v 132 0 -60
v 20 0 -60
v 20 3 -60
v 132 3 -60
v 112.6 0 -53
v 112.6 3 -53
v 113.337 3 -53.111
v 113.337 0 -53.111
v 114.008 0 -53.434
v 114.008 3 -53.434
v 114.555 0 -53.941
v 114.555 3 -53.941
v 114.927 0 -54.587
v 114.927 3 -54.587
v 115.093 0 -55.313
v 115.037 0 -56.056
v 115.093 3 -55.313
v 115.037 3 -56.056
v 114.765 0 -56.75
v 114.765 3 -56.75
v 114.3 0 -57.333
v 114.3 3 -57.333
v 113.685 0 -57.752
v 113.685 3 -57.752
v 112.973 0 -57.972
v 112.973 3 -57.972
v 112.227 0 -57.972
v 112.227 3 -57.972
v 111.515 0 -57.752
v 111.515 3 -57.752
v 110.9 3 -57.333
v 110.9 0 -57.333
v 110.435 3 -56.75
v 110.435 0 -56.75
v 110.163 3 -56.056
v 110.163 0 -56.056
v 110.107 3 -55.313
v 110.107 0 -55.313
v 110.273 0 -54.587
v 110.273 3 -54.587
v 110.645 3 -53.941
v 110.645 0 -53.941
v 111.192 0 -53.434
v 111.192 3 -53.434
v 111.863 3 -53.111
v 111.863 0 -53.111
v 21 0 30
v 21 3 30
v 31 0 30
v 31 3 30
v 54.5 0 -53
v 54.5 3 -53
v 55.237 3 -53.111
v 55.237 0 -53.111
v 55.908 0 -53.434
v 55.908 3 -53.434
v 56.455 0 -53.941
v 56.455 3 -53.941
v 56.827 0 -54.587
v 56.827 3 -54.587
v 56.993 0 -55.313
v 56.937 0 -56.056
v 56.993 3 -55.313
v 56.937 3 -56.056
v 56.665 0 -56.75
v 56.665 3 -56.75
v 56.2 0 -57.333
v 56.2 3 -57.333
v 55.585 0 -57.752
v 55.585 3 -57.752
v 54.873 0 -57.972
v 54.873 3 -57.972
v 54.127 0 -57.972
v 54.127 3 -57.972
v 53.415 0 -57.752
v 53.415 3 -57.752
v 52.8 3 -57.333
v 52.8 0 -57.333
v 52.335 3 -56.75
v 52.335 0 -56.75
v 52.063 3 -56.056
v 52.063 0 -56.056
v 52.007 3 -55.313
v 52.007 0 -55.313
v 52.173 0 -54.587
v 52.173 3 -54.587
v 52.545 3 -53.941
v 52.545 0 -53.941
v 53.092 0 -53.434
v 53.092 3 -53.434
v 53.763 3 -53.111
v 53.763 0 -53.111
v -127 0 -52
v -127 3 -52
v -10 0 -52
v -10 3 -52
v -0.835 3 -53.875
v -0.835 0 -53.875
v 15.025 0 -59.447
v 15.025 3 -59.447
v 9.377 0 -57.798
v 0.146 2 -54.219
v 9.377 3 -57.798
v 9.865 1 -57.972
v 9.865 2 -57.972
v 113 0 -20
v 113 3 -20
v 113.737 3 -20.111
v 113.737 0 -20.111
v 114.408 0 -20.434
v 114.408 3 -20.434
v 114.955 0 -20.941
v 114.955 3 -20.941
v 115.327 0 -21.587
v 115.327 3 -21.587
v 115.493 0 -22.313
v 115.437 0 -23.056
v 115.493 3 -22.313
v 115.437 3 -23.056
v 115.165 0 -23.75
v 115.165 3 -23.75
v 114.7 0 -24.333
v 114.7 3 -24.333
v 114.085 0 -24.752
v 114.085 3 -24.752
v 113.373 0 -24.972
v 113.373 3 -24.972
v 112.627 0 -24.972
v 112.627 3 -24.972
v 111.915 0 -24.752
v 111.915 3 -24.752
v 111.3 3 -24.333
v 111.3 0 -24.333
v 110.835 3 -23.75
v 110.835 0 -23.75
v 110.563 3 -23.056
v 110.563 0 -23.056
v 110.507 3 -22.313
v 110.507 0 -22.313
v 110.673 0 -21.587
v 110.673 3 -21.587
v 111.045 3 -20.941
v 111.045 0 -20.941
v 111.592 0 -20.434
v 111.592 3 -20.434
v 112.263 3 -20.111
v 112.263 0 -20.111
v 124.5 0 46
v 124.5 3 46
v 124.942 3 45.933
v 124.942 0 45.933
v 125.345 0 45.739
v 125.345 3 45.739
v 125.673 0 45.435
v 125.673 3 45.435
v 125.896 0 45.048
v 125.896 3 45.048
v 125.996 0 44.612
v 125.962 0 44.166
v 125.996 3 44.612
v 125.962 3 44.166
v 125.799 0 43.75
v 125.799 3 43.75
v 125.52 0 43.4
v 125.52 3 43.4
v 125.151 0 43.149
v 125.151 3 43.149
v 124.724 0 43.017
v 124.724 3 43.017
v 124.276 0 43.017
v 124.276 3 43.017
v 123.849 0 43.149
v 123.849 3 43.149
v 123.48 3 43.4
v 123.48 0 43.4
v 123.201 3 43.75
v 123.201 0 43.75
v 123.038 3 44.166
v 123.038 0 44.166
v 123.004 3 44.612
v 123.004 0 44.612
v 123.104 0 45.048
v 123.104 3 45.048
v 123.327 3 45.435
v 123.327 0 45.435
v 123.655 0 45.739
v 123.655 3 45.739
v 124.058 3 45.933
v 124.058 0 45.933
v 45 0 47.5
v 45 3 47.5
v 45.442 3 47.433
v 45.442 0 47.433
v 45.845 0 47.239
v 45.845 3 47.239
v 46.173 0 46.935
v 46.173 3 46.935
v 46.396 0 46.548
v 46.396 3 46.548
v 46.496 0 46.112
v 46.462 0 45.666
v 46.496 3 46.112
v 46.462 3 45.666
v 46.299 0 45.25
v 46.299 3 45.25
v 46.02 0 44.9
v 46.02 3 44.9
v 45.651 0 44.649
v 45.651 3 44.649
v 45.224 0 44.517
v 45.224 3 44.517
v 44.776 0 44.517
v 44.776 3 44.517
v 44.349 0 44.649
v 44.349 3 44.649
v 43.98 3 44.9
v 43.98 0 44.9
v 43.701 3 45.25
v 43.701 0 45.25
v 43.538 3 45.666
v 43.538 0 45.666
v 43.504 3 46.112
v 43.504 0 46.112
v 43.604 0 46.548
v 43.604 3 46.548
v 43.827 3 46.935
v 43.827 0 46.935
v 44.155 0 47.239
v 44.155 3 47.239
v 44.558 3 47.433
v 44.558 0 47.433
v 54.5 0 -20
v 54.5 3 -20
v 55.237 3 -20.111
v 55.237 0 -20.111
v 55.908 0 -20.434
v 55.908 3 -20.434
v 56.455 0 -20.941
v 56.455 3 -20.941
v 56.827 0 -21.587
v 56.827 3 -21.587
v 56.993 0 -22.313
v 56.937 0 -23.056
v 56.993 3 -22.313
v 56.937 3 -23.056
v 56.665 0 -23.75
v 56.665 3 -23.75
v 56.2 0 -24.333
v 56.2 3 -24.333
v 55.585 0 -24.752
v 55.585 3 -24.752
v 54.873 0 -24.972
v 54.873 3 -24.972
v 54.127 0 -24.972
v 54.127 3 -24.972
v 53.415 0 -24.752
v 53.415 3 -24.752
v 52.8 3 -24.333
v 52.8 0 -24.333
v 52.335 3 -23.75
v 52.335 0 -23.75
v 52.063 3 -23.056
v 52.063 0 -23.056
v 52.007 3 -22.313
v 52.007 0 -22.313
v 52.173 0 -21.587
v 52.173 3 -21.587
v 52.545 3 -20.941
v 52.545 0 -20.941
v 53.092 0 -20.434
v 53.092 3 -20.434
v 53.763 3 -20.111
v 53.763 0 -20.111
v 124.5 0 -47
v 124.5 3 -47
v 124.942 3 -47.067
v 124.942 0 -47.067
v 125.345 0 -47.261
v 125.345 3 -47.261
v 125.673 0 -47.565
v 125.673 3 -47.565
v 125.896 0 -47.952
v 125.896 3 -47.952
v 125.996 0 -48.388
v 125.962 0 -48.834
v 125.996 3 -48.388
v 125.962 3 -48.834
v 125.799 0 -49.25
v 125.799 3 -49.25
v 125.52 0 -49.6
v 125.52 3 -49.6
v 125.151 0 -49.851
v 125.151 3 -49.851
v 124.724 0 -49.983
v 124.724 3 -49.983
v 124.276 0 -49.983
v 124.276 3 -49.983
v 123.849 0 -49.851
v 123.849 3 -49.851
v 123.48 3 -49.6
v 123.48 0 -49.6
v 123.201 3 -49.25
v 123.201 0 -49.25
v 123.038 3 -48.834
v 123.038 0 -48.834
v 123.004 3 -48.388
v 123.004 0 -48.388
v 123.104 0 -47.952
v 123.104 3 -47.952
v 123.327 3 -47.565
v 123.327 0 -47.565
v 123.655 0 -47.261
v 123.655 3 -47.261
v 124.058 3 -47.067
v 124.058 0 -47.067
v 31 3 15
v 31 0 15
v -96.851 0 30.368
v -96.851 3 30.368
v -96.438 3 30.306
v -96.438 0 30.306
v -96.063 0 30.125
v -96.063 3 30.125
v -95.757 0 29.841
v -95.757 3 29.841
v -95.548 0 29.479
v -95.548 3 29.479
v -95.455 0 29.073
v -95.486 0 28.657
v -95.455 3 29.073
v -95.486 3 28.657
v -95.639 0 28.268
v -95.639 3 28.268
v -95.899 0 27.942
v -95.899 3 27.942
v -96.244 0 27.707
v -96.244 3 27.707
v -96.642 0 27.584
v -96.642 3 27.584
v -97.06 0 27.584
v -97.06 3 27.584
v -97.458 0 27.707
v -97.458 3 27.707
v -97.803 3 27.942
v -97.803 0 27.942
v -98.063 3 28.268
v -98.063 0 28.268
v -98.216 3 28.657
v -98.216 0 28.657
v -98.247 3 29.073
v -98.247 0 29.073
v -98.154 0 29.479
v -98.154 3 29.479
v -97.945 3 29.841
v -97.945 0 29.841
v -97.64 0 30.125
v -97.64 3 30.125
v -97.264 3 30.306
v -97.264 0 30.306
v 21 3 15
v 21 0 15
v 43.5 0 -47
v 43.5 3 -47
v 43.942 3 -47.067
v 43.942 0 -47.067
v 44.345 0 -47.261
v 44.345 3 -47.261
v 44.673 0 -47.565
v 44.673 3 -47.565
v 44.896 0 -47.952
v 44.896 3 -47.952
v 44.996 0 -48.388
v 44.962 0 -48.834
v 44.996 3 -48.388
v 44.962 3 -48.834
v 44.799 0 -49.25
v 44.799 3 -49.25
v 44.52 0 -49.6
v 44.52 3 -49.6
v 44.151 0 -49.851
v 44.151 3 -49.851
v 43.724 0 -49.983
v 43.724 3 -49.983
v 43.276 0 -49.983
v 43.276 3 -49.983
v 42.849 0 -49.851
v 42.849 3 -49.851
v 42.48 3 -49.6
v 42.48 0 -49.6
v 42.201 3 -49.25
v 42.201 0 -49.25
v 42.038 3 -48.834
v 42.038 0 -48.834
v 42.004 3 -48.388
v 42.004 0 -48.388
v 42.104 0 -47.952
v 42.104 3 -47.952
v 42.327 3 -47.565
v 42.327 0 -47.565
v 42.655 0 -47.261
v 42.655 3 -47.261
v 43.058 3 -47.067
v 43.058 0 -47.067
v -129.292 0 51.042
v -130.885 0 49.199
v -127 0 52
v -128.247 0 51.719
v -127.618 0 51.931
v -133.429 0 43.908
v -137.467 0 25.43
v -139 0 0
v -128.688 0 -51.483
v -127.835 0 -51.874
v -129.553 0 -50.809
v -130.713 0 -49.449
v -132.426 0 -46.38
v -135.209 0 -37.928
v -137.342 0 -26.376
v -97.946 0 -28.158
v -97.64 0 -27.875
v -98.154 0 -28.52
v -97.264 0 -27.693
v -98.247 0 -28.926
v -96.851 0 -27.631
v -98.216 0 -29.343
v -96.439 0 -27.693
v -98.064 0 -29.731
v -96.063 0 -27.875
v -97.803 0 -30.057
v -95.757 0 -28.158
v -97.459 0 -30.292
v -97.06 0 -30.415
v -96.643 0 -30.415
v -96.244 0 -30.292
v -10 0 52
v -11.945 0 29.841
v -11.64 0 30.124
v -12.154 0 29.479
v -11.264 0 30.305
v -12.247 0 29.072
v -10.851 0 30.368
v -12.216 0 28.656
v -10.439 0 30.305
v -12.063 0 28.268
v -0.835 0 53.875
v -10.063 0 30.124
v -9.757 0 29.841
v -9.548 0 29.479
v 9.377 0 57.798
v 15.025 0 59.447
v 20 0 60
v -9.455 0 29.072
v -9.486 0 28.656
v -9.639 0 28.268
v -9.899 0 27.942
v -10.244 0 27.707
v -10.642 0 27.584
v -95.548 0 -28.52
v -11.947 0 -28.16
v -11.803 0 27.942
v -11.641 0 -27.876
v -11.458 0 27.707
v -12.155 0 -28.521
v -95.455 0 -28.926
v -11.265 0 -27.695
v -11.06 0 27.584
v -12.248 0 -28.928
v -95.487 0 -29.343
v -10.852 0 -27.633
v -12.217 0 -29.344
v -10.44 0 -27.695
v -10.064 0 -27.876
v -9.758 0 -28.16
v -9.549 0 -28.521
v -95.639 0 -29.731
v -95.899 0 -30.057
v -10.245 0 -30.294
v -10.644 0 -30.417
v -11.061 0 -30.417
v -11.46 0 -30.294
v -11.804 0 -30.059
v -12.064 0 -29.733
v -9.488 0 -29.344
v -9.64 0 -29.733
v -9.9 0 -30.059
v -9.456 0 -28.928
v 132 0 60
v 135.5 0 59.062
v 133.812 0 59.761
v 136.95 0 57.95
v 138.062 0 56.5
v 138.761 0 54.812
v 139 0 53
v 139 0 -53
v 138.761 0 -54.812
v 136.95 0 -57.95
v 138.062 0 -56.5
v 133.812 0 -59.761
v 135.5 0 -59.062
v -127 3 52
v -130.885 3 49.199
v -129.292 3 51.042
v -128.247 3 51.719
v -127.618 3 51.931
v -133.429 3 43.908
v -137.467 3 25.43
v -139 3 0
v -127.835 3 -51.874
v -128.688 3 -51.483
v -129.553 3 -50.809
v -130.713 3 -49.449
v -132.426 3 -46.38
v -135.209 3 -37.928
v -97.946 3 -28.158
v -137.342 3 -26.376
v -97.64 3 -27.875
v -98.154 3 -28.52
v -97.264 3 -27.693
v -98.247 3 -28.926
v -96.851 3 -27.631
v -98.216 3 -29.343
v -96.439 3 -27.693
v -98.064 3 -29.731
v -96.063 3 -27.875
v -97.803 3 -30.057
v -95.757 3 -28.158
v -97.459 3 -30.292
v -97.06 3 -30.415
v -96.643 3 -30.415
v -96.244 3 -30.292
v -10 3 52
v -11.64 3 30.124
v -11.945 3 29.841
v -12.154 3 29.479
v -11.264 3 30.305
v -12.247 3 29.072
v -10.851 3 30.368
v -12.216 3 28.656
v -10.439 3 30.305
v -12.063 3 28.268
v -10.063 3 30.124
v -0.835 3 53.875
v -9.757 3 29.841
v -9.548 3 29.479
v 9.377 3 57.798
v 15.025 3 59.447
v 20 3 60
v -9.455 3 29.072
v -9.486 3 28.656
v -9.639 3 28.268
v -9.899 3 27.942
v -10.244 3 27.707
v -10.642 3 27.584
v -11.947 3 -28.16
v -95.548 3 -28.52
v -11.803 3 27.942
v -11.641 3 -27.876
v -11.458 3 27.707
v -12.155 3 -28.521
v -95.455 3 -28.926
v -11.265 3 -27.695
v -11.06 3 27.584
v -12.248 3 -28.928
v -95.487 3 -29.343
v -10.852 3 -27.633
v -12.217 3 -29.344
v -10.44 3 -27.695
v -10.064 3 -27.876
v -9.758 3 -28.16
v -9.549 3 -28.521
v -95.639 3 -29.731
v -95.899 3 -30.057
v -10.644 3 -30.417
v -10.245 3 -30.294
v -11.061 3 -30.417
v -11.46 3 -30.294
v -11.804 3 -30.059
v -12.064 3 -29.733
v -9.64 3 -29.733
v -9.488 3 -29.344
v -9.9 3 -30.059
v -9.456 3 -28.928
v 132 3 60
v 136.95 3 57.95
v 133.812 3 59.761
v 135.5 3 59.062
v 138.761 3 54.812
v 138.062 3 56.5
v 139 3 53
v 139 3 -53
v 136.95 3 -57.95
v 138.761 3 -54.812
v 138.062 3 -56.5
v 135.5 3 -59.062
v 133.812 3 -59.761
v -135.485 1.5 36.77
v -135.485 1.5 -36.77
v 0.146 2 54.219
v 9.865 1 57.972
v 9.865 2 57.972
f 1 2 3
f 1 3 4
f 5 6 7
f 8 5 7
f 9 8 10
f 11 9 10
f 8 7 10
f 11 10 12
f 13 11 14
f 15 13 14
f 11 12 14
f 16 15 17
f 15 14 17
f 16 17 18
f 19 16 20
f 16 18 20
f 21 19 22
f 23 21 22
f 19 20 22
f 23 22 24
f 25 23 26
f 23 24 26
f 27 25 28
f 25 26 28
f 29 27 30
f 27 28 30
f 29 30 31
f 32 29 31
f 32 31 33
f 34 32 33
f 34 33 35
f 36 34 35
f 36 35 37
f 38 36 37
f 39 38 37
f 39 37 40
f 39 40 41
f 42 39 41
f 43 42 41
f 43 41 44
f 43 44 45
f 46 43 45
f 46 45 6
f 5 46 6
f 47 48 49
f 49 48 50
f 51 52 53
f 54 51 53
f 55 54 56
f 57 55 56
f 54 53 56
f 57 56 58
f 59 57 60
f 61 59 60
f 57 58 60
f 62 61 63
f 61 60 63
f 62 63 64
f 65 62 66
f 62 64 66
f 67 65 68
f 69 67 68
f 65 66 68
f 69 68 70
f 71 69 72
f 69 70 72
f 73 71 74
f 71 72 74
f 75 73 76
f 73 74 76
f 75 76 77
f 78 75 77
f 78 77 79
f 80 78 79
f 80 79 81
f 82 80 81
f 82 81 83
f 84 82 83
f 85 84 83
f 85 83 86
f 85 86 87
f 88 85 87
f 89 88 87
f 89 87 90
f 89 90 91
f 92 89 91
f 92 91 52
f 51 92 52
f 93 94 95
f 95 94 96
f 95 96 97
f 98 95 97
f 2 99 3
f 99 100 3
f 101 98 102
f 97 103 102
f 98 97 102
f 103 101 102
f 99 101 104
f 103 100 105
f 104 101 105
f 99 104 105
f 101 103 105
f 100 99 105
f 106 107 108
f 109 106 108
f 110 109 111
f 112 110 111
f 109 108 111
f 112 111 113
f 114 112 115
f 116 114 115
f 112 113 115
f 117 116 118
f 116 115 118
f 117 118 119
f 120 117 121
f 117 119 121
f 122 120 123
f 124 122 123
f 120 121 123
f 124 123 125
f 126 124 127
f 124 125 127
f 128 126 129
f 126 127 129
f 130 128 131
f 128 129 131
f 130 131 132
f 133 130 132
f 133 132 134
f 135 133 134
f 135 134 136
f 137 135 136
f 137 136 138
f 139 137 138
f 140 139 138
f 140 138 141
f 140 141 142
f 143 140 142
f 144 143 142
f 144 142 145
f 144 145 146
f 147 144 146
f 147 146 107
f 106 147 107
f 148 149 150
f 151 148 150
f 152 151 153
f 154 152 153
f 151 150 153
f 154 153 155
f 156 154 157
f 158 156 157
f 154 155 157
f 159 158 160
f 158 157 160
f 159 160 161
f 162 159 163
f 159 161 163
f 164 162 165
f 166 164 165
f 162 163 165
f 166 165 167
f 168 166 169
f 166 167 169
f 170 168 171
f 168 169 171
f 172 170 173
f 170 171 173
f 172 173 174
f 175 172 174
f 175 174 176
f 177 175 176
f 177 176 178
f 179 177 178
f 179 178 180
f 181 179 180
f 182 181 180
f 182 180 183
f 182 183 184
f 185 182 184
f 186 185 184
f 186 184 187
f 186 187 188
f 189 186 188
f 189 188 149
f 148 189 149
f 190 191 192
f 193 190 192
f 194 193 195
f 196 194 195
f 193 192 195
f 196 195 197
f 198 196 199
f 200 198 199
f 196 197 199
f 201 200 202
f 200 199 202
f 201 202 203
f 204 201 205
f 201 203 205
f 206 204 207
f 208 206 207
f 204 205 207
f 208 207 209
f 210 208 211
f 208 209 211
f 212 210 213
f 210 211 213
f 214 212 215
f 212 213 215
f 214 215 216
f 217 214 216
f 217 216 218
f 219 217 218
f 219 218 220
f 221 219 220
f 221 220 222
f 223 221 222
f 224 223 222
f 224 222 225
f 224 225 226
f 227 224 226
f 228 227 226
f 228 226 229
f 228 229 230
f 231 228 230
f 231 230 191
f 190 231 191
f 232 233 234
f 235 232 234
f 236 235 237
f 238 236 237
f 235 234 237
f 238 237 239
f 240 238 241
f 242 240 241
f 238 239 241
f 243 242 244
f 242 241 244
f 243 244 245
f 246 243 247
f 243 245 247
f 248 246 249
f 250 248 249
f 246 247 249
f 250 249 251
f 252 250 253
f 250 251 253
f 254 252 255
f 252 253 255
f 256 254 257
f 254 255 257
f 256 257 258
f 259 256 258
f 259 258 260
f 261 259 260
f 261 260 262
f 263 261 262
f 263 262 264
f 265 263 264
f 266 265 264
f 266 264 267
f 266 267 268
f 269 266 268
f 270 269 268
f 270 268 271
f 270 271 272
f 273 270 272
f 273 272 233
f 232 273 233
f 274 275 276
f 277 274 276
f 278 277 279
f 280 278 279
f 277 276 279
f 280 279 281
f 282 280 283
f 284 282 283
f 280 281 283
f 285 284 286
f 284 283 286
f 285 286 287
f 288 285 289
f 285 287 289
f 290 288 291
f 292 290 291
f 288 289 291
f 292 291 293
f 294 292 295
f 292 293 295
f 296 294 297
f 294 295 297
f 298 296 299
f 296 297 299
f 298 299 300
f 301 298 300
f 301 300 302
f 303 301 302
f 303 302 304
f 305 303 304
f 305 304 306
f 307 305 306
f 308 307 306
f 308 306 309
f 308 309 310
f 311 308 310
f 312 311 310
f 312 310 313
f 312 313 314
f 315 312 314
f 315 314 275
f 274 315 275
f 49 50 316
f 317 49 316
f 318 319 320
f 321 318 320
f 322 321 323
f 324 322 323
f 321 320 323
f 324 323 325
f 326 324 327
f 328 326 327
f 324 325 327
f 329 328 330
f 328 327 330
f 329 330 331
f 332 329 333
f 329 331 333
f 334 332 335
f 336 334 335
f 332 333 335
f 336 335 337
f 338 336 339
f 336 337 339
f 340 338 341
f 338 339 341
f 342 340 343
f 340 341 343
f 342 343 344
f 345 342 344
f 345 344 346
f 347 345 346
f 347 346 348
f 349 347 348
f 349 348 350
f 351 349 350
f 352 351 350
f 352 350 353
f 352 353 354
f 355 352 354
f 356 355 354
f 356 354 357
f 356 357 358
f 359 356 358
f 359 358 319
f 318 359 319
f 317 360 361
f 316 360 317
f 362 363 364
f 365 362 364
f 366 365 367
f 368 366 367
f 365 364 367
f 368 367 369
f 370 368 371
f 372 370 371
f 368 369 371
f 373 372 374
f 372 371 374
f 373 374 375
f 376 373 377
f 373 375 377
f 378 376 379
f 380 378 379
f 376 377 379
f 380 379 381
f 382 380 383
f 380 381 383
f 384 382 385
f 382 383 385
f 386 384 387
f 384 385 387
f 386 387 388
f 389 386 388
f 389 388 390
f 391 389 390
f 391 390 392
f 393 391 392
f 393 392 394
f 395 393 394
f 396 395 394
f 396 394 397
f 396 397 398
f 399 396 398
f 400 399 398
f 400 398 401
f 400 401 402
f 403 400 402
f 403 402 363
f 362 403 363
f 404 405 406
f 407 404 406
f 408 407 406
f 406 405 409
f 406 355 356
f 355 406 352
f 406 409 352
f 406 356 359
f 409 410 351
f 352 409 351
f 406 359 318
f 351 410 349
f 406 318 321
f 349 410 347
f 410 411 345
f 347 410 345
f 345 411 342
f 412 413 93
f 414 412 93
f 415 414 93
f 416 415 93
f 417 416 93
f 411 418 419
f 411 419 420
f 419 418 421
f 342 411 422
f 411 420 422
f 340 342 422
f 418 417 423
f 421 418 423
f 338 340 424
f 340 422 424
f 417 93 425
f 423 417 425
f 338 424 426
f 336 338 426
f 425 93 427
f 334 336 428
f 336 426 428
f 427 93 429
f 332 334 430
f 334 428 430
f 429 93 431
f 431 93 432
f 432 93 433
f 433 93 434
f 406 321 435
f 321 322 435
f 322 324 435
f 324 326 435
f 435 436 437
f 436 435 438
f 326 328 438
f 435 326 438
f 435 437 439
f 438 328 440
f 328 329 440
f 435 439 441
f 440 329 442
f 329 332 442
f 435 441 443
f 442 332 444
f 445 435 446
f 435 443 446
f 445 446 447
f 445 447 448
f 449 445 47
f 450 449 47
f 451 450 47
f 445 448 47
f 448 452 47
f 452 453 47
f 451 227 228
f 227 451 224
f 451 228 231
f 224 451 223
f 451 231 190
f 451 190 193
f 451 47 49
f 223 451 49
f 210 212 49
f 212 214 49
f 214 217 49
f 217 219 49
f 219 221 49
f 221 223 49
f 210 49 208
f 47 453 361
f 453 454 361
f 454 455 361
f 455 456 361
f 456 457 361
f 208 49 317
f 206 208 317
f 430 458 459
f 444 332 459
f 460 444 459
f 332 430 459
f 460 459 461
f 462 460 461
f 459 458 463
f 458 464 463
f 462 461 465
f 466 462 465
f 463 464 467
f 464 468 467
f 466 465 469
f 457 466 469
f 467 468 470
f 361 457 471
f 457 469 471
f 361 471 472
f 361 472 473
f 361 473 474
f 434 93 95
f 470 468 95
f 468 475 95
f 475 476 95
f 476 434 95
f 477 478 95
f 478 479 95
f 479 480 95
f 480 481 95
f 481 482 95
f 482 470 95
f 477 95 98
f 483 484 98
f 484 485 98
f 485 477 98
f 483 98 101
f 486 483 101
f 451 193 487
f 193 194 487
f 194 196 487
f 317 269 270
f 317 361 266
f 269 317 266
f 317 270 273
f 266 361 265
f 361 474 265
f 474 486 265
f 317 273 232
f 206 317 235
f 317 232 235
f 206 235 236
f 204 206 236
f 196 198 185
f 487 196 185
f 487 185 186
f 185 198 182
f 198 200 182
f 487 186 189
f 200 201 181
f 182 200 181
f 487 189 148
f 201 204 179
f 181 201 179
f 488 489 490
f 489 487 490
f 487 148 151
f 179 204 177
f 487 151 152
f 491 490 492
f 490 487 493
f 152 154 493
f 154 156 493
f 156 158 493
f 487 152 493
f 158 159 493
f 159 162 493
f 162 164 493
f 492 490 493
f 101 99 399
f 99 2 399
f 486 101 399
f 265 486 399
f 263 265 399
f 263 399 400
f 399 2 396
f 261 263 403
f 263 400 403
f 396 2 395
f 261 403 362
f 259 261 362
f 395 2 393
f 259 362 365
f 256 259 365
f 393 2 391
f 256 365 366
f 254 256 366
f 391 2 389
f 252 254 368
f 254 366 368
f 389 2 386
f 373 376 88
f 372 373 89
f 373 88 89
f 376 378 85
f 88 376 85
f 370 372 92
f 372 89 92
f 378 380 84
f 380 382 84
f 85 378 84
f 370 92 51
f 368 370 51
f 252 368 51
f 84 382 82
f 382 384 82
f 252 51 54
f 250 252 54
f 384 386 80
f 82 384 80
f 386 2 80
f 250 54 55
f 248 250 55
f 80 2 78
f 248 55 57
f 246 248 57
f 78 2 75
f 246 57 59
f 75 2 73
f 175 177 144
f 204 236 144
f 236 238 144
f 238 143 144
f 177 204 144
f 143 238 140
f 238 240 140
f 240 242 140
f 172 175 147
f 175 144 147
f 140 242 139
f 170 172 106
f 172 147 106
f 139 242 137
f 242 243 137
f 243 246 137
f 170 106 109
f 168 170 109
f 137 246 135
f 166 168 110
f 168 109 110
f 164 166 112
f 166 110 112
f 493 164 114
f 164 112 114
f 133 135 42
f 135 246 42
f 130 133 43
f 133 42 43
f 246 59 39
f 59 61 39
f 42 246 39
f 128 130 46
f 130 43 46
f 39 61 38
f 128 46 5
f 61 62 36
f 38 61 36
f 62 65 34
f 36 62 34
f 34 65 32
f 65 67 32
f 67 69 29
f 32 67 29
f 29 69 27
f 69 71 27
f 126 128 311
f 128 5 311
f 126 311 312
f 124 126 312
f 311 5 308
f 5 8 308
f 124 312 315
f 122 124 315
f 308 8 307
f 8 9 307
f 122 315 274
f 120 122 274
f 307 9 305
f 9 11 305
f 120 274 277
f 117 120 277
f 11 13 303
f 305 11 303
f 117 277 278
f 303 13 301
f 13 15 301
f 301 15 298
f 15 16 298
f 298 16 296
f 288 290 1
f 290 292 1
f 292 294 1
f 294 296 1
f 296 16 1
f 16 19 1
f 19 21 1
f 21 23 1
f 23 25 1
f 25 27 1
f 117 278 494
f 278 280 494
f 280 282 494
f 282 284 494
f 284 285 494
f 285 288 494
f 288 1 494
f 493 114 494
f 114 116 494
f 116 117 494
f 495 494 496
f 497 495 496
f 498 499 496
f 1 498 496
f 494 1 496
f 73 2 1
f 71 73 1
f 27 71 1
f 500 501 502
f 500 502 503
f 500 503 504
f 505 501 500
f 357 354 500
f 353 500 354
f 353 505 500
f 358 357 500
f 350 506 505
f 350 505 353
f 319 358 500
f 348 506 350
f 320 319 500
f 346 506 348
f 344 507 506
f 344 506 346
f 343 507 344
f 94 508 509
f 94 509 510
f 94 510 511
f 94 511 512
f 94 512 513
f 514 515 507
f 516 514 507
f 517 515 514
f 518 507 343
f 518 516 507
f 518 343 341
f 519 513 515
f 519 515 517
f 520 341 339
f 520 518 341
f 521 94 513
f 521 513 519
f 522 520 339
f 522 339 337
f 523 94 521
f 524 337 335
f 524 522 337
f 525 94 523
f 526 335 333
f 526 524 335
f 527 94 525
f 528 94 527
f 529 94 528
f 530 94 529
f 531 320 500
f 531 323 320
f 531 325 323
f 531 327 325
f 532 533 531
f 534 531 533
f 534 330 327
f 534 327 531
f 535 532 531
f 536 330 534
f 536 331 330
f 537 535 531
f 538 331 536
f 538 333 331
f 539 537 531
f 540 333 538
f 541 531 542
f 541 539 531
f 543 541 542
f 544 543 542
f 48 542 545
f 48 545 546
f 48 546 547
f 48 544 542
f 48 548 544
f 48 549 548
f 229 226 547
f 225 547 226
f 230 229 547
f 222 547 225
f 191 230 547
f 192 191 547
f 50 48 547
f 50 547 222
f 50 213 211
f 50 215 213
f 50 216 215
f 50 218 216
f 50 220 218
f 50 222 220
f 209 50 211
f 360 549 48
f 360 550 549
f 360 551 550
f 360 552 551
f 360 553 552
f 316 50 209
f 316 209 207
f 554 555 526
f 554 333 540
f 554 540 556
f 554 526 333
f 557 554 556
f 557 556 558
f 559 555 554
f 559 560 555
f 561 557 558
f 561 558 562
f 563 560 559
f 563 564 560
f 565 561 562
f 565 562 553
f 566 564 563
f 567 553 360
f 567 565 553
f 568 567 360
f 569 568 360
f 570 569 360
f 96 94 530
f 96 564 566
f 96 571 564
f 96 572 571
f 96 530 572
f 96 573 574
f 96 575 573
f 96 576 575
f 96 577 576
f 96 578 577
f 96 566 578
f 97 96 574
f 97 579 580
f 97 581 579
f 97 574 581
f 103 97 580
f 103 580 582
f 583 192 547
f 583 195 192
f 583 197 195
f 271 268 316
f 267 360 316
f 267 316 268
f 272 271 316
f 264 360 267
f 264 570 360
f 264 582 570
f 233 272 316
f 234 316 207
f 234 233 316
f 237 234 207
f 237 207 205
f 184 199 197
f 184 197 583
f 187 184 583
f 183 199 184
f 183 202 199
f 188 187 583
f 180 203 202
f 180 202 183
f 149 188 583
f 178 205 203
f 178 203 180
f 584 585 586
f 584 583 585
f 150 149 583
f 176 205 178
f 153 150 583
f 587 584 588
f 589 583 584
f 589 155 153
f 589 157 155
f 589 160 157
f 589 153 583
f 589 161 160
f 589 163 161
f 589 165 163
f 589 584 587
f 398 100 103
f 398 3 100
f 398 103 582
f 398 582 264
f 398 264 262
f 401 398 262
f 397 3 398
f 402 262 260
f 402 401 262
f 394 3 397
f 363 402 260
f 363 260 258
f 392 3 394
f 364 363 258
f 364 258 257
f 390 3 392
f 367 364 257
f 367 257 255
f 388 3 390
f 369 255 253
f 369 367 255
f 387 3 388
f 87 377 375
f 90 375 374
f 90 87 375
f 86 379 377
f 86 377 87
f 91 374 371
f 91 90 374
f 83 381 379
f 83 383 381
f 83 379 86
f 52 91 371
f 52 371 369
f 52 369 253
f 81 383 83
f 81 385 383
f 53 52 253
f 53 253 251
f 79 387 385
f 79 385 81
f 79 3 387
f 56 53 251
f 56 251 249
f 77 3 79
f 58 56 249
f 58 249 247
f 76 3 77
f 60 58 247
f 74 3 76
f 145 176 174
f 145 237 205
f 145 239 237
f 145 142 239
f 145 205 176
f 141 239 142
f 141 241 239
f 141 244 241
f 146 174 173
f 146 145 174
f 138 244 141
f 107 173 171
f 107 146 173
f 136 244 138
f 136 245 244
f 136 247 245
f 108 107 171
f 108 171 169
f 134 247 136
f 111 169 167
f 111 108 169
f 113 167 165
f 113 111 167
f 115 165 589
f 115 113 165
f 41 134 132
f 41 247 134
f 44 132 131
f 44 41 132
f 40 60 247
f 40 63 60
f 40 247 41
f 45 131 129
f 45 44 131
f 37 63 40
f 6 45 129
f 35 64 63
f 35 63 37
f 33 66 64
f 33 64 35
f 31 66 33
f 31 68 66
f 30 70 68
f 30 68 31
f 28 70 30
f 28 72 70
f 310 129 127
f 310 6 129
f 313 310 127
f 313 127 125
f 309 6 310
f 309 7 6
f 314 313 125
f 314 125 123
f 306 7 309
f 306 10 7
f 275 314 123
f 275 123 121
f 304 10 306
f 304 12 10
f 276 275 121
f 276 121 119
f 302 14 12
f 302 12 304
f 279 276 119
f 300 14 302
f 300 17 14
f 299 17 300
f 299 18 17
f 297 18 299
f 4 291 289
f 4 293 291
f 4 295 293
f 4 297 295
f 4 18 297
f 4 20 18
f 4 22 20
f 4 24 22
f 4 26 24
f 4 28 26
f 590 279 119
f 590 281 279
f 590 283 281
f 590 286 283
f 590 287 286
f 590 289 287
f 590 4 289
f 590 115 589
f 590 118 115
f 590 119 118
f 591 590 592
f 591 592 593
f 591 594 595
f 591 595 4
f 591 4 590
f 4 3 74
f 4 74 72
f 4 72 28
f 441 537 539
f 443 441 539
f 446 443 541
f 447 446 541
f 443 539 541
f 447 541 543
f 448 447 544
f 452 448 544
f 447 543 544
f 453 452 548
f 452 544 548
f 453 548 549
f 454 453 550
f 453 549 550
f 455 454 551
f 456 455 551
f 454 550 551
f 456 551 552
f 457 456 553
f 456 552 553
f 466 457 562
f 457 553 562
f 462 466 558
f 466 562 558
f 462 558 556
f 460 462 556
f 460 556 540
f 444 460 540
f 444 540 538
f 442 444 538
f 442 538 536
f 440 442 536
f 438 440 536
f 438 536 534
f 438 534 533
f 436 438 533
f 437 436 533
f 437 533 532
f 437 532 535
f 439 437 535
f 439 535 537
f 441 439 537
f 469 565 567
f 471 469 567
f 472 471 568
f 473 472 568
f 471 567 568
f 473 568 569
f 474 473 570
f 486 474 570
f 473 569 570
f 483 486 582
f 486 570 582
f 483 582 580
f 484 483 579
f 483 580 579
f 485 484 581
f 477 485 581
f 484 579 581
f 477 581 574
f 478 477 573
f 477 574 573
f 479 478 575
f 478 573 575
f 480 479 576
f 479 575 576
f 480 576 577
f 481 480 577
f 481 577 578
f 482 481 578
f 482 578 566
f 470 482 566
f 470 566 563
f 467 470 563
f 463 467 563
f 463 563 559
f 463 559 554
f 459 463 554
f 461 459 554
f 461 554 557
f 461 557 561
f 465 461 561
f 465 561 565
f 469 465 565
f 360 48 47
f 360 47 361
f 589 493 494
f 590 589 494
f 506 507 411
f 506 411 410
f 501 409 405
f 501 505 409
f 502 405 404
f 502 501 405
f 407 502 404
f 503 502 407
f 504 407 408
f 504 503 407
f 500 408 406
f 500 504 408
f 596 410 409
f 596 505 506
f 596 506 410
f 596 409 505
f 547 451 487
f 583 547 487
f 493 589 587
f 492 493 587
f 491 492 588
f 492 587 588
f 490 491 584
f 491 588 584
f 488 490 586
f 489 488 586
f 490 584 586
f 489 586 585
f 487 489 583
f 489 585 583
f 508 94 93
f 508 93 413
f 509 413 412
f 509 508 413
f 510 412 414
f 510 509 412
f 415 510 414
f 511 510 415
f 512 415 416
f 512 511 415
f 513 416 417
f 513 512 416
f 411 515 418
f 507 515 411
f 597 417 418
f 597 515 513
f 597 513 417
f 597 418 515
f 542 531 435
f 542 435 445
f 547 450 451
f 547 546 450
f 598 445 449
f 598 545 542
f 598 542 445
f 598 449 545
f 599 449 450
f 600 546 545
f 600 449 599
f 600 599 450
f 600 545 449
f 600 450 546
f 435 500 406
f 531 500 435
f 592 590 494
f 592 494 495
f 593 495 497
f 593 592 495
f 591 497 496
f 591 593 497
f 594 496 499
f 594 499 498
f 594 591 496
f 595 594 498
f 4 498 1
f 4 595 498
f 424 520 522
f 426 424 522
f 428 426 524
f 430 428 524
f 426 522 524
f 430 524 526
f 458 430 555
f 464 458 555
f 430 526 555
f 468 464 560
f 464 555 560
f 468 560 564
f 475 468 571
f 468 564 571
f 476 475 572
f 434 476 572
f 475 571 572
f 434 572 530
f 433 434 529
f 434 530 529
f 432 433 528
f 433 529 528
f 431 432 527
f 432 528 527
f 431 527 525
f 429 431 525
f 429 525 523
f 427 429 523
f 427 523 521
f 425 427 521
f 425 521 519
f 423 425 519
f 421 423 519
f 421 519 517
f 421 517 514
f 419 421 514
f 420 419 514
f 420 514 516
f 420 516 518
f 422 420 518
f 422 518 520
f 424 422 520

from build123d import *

# Parameters (mm, degrees)
SKETCH_1_W           = 278
SKETCH_1_H           = 120
EXTRUDE_1_DEPTH      = 3
SKETCH_2_W           = 129
SKETCH_2_H           = 8
CUT_EXTRUDE_1_DEPTH  = 3
CUT_EXTRUDE_2_DEPTH  = 3
CUT_EXTRUDE_4_DEPTH  = 3
CUT_EXTRUDE_5_DEPTH  = 3
SKETCH_16_R          = 1.39979
CUT_EXTRUDE_9_DEPTH  = 10
SKETCH_18_W          = 10
SKETCH_18_H          = 15
CUT_EXTRUDE_10_DEPTH = 10
SKETCH_19_R          = 2.5
CUT_EXTRUDE_11_DEPTH = 10
SKETCH_20_R          = 1.5
CUT_EXTRUDE_12_DEPTH = 10
SKETCH_21_R          = 1.5
CUT_EXTRUDE_13_DEPTH = 10
SKETCH_22_R          = 2.5
CUT_EXTRUDE_14_DEPTH = 10
SKETCH_23_R          = 2.5
CUT_EXTRUDE_15_DEPTH = 10
SKETCH_24_R          = 1.5
CUT_EXTRUDE_16_DEPTH = 10
SKETCH_25_R          = 1.5
CUT_EXTRUDE_17_DEPTH = 10


with BuildPart() as part:
    # 스케치1 → 보스-돌출1 (new body)
    with BuildSketch(Plane(origin=(0, 0, 0), x_dir=(1, 0, 0), z_dir=(0, 1, 0))):
        Rectangle(SKETCH_1_W, SKETCH_1_H)
    extrude(amount=EXTRUDE_1_DEPTH)

    # 스케치2 → 컷-돌출1 (cut)
    with BuildSketch(Plane(origin=(0, 3, 0), x_dir=(1, 0, 0), z_dir=(0, 1, 0))):
        with Locations((-74.5, -56)):
            Rectangle(SKETCH_2_W, SKETCH_2_H)
        with Locations((-74.5, 56)):
            Rectangle(SKETCH_2_W, SKETCH_2_H)
    extrude(amount=-CUT_EXTRUDE_1_DEPTH, mode=Mode.SUBTRACT)

    # 스케치3 → 컷-돌출2 (cut)
    with BuildSketch(Plane(origin=(0, 3, 0), x_dir=(1, 0, 0), z_dir=(0, 1, 0))):
        with BuildLine():
            add(Edge.make_bspline(
                [(-127, 52), (-139, 52), (-139, 0)],
                knots=[3.141592654, 3.141592654, 3.141592654, 4.71238898, 4.71238898, 4.71238898], degree=2, weights=[1, 0.707106781, 1]))
            Line((-127, 52), (-139, 52))
            Line((-139, 52), (-139, 0))
        make_face()
        with BuildLine():
            Line((-139, -52), (-127, -52))
            add(Edge.make_bspline(
                [(-139, 0), (-139, -52), (-127, -52)],
                knots=[4.71238898, 4.71238898, 4.71238898, 6.283185307, 6.283185307, 6.283185307], degree=2, weights=[1, 0.707106781, 1]))
            Line((-139, 0), (-139, -52))
        make_face()
    extrude(amount=-CUT_EXTRUDE_2_DEPTH, mode=Mode.SUBTRACT)

    # 스케치4 → 컷-돌출4 (cut)
    with BuildSketch(Plane(origin=(0, 3, 0), x_dir=(1, 0, 0), z_dir=(0, 1, 0))):
        with BuildLine():
            Line((-10, 52), (-10, 60))
            Line((-10, 60), (20, 60))
            add(Edge.make_bspline(
                [(-10, 52), (0.64121866, 52.367223255), (9.376693721, 59.919927591), (20, 60)],
                knots=[0, 0, 0, 0, 1, 1, 1, 1], degree=3))
        make_face()
        with BuildLine():
            Line((-10, -52), (-10, -60))
            Line((-10, -60), (20, -60))
            add(Edge.make_bspline(
                [(-10, -52), (0.64121866, -52.367223255), (9.376693721, -59.919927591), (20, -60)],
                knots=[0, 0, 0, 0, 1, 1, 1, 1], degree=3))
        make_face()
    extrude(amount=-CUT_EXTRUDE_4_DEPTH, mode=Mode.SUBTRACT)

    # 스케치5 → 컷-돌출5 (cut)
    with BuildSketch(Plane(origin=(0, 3, 0), x_dir=(1, 0, 0), z_dir=(0, 1, 0))):
        with BuildLine():
            Line((132, 60), (139, 60))
            Line((139, 60), (139, 53))
            ThreePointArc((139, 53), (136.949747468, 57.949747468), (132, 60))
        make_face()
        with BuildLine():
            Line((139, -60), (139, -53))
            ThreePointArc((139, -53), (136.949747468, -57.949747468), (132, -60))
            Line((132, -60), (139, -60))
        make_face()
    extrude(amount=-CUT_EXTRUDE_5_DEPTH, mode=Mode.SUBTRACT)

    # 스케치16 → 컷-돌출9 (cut)
    with BuildSketch(Plane(origin=(0, 3, 0), x_dir=(1, 0, 0), z_dir=(0, 1, 0))):
        with Locations(Location((-96.85129, 29.0311, 0), (0, 0, 270))):
            Circle(SKETCH_16_R)
        with Locations(Location((-96.85109, -28.96802, 0), (0, 0, 270))):
            Circle(SKETCH_16_R)
        with Locations(Location((-10.85223, 29.03265, 0), (0, 0, 270))):
            Circle(SKETCH_16_R)
        with Locations(Location((-10.8511, -28.96784, 0), (0, 0, 270))):
            Circle(SKETCH_16_R)
    extrude(amount=-CUT_EXTRUDE_9_DEPTH, mode=Mode.SUBTRACT)

    # 스케치18 → 컷-돌출10 (cut)
    with BuildSketch(Plane(origin=(0, 3, 0), x_dir=(1, 0, 0), z_dir=(0, 1, 0))):
        with Locations((26, -22.5)):
            Rectangle(SKETCH_18_W, SKETCH_18_H)
    extrude(amount=-CUT_EXTRUDE_10_DEPTH, mode=Mode.SUBTRACT)

    # 스케치19 → 컷-돌출11 (cut)
    with BuildSketch(Plane(origin=(0, 3, 0), x_dir=(1, 0, 0), z_dir=(0, 1, 0))):
        with Locations(Location((112.6, 55.5, 0), (0, 0, 270))):
            Circle(SKETCH_19_R)
    extrude(amount=-CUT_EXTRUDE_11_DEPTH, mode=Mode.SUBTRACT)

    # 스케치20 → 컷-돌출12 (cut)
    with BuildSketch(Plane(origin=(0, 3, 0), x_dir=(1, 0, 0), z_dir=(0, 1, 0))):
        with Locations(Location((124.5, 48.5, 0), (0, 0, 270))):
            Circle(SKETCH_20_R)
    extrude(amount=-CUT_EXTRUDE_12_DEPTH, mode=Mode.SUBTRACT)

    # 스케치21 → 컷-돌출13 (cut)
    with BuildSketch(Plane(origin=(0, 3, 0), x_dir=(1, 0, 0), z_dir=(0, 1, 0))):
        with Locations(Location((124.5, -44.5, 0), (0, 0, 270))):
            Circle(SKETCH_21_R)
    extrude(amount=-CUT_EXTRUDE_13_DEPTH, mode=Mode.SUBTRACT)

    # 스케치22 → 컷-돌출14 (cut)
    with BuildSketch(Plane(origin=(0, 3, 0), x_dir=(1, 0, 0), z_dir=(0, 1, 0))):
        with Locations(Location((54.5, 55.5, 0), (0, 0, 270))):
            Circle(SKETCH_22_R)
    extrude(amount=-CUT_EXTRUDE_14_DEPTH, mode=Mode.SUBTRACT)

    # 스케치23 → 컷-돌출15 (cut)
    with BuildSketch(Plane(origin=(0, 3, 0), x_dir=(1, 0, 0), z_dir=(0, 1, 0))):
        with Locations(Location((113, 22.5, 0), (0, 0, 270))):
            Circle(SKETCH_23_R)
        with Locations(Location((54.5, 22.5, 0), (0, 0, 270))):
            Circle(SKETCH_23_R)
    extrude(amount=-CUT_EXTRUDE_15_DEPTH, mode=Mode.SUBTRACT)

    # 스케치24 → 컷-돌출16 (cut)
    with BuildSketch(Plane(origin=(0, 3, 0), x_dir=(1, 0, 0), z_dir=(0, 1, 0))):
        with Locations(Location((45, -46, 0), (0, 0, 270))):
            Circle(SKETCH_24_R)
    extrude(amount=-CUT_EXTRUDE_16_DEPTH, mode=Mode.SUBTRACT)

    # 스케치25 → 컷-돌출17 (cut)
    with BuildSketch(Plane(origin=(0, 3, 0), x_dir=(1, 0, 0), z_dir=(0, 1, 0))):
        with Locations(Location((43.5, 48.5, 0), (0, 0, 270))):
            Circle(SKETCH_25_R)
    extrude(amount=-CUT_EXTRUDE_17_DEPTH, mode=Mode.SUBTRACT)


solid = part.part
